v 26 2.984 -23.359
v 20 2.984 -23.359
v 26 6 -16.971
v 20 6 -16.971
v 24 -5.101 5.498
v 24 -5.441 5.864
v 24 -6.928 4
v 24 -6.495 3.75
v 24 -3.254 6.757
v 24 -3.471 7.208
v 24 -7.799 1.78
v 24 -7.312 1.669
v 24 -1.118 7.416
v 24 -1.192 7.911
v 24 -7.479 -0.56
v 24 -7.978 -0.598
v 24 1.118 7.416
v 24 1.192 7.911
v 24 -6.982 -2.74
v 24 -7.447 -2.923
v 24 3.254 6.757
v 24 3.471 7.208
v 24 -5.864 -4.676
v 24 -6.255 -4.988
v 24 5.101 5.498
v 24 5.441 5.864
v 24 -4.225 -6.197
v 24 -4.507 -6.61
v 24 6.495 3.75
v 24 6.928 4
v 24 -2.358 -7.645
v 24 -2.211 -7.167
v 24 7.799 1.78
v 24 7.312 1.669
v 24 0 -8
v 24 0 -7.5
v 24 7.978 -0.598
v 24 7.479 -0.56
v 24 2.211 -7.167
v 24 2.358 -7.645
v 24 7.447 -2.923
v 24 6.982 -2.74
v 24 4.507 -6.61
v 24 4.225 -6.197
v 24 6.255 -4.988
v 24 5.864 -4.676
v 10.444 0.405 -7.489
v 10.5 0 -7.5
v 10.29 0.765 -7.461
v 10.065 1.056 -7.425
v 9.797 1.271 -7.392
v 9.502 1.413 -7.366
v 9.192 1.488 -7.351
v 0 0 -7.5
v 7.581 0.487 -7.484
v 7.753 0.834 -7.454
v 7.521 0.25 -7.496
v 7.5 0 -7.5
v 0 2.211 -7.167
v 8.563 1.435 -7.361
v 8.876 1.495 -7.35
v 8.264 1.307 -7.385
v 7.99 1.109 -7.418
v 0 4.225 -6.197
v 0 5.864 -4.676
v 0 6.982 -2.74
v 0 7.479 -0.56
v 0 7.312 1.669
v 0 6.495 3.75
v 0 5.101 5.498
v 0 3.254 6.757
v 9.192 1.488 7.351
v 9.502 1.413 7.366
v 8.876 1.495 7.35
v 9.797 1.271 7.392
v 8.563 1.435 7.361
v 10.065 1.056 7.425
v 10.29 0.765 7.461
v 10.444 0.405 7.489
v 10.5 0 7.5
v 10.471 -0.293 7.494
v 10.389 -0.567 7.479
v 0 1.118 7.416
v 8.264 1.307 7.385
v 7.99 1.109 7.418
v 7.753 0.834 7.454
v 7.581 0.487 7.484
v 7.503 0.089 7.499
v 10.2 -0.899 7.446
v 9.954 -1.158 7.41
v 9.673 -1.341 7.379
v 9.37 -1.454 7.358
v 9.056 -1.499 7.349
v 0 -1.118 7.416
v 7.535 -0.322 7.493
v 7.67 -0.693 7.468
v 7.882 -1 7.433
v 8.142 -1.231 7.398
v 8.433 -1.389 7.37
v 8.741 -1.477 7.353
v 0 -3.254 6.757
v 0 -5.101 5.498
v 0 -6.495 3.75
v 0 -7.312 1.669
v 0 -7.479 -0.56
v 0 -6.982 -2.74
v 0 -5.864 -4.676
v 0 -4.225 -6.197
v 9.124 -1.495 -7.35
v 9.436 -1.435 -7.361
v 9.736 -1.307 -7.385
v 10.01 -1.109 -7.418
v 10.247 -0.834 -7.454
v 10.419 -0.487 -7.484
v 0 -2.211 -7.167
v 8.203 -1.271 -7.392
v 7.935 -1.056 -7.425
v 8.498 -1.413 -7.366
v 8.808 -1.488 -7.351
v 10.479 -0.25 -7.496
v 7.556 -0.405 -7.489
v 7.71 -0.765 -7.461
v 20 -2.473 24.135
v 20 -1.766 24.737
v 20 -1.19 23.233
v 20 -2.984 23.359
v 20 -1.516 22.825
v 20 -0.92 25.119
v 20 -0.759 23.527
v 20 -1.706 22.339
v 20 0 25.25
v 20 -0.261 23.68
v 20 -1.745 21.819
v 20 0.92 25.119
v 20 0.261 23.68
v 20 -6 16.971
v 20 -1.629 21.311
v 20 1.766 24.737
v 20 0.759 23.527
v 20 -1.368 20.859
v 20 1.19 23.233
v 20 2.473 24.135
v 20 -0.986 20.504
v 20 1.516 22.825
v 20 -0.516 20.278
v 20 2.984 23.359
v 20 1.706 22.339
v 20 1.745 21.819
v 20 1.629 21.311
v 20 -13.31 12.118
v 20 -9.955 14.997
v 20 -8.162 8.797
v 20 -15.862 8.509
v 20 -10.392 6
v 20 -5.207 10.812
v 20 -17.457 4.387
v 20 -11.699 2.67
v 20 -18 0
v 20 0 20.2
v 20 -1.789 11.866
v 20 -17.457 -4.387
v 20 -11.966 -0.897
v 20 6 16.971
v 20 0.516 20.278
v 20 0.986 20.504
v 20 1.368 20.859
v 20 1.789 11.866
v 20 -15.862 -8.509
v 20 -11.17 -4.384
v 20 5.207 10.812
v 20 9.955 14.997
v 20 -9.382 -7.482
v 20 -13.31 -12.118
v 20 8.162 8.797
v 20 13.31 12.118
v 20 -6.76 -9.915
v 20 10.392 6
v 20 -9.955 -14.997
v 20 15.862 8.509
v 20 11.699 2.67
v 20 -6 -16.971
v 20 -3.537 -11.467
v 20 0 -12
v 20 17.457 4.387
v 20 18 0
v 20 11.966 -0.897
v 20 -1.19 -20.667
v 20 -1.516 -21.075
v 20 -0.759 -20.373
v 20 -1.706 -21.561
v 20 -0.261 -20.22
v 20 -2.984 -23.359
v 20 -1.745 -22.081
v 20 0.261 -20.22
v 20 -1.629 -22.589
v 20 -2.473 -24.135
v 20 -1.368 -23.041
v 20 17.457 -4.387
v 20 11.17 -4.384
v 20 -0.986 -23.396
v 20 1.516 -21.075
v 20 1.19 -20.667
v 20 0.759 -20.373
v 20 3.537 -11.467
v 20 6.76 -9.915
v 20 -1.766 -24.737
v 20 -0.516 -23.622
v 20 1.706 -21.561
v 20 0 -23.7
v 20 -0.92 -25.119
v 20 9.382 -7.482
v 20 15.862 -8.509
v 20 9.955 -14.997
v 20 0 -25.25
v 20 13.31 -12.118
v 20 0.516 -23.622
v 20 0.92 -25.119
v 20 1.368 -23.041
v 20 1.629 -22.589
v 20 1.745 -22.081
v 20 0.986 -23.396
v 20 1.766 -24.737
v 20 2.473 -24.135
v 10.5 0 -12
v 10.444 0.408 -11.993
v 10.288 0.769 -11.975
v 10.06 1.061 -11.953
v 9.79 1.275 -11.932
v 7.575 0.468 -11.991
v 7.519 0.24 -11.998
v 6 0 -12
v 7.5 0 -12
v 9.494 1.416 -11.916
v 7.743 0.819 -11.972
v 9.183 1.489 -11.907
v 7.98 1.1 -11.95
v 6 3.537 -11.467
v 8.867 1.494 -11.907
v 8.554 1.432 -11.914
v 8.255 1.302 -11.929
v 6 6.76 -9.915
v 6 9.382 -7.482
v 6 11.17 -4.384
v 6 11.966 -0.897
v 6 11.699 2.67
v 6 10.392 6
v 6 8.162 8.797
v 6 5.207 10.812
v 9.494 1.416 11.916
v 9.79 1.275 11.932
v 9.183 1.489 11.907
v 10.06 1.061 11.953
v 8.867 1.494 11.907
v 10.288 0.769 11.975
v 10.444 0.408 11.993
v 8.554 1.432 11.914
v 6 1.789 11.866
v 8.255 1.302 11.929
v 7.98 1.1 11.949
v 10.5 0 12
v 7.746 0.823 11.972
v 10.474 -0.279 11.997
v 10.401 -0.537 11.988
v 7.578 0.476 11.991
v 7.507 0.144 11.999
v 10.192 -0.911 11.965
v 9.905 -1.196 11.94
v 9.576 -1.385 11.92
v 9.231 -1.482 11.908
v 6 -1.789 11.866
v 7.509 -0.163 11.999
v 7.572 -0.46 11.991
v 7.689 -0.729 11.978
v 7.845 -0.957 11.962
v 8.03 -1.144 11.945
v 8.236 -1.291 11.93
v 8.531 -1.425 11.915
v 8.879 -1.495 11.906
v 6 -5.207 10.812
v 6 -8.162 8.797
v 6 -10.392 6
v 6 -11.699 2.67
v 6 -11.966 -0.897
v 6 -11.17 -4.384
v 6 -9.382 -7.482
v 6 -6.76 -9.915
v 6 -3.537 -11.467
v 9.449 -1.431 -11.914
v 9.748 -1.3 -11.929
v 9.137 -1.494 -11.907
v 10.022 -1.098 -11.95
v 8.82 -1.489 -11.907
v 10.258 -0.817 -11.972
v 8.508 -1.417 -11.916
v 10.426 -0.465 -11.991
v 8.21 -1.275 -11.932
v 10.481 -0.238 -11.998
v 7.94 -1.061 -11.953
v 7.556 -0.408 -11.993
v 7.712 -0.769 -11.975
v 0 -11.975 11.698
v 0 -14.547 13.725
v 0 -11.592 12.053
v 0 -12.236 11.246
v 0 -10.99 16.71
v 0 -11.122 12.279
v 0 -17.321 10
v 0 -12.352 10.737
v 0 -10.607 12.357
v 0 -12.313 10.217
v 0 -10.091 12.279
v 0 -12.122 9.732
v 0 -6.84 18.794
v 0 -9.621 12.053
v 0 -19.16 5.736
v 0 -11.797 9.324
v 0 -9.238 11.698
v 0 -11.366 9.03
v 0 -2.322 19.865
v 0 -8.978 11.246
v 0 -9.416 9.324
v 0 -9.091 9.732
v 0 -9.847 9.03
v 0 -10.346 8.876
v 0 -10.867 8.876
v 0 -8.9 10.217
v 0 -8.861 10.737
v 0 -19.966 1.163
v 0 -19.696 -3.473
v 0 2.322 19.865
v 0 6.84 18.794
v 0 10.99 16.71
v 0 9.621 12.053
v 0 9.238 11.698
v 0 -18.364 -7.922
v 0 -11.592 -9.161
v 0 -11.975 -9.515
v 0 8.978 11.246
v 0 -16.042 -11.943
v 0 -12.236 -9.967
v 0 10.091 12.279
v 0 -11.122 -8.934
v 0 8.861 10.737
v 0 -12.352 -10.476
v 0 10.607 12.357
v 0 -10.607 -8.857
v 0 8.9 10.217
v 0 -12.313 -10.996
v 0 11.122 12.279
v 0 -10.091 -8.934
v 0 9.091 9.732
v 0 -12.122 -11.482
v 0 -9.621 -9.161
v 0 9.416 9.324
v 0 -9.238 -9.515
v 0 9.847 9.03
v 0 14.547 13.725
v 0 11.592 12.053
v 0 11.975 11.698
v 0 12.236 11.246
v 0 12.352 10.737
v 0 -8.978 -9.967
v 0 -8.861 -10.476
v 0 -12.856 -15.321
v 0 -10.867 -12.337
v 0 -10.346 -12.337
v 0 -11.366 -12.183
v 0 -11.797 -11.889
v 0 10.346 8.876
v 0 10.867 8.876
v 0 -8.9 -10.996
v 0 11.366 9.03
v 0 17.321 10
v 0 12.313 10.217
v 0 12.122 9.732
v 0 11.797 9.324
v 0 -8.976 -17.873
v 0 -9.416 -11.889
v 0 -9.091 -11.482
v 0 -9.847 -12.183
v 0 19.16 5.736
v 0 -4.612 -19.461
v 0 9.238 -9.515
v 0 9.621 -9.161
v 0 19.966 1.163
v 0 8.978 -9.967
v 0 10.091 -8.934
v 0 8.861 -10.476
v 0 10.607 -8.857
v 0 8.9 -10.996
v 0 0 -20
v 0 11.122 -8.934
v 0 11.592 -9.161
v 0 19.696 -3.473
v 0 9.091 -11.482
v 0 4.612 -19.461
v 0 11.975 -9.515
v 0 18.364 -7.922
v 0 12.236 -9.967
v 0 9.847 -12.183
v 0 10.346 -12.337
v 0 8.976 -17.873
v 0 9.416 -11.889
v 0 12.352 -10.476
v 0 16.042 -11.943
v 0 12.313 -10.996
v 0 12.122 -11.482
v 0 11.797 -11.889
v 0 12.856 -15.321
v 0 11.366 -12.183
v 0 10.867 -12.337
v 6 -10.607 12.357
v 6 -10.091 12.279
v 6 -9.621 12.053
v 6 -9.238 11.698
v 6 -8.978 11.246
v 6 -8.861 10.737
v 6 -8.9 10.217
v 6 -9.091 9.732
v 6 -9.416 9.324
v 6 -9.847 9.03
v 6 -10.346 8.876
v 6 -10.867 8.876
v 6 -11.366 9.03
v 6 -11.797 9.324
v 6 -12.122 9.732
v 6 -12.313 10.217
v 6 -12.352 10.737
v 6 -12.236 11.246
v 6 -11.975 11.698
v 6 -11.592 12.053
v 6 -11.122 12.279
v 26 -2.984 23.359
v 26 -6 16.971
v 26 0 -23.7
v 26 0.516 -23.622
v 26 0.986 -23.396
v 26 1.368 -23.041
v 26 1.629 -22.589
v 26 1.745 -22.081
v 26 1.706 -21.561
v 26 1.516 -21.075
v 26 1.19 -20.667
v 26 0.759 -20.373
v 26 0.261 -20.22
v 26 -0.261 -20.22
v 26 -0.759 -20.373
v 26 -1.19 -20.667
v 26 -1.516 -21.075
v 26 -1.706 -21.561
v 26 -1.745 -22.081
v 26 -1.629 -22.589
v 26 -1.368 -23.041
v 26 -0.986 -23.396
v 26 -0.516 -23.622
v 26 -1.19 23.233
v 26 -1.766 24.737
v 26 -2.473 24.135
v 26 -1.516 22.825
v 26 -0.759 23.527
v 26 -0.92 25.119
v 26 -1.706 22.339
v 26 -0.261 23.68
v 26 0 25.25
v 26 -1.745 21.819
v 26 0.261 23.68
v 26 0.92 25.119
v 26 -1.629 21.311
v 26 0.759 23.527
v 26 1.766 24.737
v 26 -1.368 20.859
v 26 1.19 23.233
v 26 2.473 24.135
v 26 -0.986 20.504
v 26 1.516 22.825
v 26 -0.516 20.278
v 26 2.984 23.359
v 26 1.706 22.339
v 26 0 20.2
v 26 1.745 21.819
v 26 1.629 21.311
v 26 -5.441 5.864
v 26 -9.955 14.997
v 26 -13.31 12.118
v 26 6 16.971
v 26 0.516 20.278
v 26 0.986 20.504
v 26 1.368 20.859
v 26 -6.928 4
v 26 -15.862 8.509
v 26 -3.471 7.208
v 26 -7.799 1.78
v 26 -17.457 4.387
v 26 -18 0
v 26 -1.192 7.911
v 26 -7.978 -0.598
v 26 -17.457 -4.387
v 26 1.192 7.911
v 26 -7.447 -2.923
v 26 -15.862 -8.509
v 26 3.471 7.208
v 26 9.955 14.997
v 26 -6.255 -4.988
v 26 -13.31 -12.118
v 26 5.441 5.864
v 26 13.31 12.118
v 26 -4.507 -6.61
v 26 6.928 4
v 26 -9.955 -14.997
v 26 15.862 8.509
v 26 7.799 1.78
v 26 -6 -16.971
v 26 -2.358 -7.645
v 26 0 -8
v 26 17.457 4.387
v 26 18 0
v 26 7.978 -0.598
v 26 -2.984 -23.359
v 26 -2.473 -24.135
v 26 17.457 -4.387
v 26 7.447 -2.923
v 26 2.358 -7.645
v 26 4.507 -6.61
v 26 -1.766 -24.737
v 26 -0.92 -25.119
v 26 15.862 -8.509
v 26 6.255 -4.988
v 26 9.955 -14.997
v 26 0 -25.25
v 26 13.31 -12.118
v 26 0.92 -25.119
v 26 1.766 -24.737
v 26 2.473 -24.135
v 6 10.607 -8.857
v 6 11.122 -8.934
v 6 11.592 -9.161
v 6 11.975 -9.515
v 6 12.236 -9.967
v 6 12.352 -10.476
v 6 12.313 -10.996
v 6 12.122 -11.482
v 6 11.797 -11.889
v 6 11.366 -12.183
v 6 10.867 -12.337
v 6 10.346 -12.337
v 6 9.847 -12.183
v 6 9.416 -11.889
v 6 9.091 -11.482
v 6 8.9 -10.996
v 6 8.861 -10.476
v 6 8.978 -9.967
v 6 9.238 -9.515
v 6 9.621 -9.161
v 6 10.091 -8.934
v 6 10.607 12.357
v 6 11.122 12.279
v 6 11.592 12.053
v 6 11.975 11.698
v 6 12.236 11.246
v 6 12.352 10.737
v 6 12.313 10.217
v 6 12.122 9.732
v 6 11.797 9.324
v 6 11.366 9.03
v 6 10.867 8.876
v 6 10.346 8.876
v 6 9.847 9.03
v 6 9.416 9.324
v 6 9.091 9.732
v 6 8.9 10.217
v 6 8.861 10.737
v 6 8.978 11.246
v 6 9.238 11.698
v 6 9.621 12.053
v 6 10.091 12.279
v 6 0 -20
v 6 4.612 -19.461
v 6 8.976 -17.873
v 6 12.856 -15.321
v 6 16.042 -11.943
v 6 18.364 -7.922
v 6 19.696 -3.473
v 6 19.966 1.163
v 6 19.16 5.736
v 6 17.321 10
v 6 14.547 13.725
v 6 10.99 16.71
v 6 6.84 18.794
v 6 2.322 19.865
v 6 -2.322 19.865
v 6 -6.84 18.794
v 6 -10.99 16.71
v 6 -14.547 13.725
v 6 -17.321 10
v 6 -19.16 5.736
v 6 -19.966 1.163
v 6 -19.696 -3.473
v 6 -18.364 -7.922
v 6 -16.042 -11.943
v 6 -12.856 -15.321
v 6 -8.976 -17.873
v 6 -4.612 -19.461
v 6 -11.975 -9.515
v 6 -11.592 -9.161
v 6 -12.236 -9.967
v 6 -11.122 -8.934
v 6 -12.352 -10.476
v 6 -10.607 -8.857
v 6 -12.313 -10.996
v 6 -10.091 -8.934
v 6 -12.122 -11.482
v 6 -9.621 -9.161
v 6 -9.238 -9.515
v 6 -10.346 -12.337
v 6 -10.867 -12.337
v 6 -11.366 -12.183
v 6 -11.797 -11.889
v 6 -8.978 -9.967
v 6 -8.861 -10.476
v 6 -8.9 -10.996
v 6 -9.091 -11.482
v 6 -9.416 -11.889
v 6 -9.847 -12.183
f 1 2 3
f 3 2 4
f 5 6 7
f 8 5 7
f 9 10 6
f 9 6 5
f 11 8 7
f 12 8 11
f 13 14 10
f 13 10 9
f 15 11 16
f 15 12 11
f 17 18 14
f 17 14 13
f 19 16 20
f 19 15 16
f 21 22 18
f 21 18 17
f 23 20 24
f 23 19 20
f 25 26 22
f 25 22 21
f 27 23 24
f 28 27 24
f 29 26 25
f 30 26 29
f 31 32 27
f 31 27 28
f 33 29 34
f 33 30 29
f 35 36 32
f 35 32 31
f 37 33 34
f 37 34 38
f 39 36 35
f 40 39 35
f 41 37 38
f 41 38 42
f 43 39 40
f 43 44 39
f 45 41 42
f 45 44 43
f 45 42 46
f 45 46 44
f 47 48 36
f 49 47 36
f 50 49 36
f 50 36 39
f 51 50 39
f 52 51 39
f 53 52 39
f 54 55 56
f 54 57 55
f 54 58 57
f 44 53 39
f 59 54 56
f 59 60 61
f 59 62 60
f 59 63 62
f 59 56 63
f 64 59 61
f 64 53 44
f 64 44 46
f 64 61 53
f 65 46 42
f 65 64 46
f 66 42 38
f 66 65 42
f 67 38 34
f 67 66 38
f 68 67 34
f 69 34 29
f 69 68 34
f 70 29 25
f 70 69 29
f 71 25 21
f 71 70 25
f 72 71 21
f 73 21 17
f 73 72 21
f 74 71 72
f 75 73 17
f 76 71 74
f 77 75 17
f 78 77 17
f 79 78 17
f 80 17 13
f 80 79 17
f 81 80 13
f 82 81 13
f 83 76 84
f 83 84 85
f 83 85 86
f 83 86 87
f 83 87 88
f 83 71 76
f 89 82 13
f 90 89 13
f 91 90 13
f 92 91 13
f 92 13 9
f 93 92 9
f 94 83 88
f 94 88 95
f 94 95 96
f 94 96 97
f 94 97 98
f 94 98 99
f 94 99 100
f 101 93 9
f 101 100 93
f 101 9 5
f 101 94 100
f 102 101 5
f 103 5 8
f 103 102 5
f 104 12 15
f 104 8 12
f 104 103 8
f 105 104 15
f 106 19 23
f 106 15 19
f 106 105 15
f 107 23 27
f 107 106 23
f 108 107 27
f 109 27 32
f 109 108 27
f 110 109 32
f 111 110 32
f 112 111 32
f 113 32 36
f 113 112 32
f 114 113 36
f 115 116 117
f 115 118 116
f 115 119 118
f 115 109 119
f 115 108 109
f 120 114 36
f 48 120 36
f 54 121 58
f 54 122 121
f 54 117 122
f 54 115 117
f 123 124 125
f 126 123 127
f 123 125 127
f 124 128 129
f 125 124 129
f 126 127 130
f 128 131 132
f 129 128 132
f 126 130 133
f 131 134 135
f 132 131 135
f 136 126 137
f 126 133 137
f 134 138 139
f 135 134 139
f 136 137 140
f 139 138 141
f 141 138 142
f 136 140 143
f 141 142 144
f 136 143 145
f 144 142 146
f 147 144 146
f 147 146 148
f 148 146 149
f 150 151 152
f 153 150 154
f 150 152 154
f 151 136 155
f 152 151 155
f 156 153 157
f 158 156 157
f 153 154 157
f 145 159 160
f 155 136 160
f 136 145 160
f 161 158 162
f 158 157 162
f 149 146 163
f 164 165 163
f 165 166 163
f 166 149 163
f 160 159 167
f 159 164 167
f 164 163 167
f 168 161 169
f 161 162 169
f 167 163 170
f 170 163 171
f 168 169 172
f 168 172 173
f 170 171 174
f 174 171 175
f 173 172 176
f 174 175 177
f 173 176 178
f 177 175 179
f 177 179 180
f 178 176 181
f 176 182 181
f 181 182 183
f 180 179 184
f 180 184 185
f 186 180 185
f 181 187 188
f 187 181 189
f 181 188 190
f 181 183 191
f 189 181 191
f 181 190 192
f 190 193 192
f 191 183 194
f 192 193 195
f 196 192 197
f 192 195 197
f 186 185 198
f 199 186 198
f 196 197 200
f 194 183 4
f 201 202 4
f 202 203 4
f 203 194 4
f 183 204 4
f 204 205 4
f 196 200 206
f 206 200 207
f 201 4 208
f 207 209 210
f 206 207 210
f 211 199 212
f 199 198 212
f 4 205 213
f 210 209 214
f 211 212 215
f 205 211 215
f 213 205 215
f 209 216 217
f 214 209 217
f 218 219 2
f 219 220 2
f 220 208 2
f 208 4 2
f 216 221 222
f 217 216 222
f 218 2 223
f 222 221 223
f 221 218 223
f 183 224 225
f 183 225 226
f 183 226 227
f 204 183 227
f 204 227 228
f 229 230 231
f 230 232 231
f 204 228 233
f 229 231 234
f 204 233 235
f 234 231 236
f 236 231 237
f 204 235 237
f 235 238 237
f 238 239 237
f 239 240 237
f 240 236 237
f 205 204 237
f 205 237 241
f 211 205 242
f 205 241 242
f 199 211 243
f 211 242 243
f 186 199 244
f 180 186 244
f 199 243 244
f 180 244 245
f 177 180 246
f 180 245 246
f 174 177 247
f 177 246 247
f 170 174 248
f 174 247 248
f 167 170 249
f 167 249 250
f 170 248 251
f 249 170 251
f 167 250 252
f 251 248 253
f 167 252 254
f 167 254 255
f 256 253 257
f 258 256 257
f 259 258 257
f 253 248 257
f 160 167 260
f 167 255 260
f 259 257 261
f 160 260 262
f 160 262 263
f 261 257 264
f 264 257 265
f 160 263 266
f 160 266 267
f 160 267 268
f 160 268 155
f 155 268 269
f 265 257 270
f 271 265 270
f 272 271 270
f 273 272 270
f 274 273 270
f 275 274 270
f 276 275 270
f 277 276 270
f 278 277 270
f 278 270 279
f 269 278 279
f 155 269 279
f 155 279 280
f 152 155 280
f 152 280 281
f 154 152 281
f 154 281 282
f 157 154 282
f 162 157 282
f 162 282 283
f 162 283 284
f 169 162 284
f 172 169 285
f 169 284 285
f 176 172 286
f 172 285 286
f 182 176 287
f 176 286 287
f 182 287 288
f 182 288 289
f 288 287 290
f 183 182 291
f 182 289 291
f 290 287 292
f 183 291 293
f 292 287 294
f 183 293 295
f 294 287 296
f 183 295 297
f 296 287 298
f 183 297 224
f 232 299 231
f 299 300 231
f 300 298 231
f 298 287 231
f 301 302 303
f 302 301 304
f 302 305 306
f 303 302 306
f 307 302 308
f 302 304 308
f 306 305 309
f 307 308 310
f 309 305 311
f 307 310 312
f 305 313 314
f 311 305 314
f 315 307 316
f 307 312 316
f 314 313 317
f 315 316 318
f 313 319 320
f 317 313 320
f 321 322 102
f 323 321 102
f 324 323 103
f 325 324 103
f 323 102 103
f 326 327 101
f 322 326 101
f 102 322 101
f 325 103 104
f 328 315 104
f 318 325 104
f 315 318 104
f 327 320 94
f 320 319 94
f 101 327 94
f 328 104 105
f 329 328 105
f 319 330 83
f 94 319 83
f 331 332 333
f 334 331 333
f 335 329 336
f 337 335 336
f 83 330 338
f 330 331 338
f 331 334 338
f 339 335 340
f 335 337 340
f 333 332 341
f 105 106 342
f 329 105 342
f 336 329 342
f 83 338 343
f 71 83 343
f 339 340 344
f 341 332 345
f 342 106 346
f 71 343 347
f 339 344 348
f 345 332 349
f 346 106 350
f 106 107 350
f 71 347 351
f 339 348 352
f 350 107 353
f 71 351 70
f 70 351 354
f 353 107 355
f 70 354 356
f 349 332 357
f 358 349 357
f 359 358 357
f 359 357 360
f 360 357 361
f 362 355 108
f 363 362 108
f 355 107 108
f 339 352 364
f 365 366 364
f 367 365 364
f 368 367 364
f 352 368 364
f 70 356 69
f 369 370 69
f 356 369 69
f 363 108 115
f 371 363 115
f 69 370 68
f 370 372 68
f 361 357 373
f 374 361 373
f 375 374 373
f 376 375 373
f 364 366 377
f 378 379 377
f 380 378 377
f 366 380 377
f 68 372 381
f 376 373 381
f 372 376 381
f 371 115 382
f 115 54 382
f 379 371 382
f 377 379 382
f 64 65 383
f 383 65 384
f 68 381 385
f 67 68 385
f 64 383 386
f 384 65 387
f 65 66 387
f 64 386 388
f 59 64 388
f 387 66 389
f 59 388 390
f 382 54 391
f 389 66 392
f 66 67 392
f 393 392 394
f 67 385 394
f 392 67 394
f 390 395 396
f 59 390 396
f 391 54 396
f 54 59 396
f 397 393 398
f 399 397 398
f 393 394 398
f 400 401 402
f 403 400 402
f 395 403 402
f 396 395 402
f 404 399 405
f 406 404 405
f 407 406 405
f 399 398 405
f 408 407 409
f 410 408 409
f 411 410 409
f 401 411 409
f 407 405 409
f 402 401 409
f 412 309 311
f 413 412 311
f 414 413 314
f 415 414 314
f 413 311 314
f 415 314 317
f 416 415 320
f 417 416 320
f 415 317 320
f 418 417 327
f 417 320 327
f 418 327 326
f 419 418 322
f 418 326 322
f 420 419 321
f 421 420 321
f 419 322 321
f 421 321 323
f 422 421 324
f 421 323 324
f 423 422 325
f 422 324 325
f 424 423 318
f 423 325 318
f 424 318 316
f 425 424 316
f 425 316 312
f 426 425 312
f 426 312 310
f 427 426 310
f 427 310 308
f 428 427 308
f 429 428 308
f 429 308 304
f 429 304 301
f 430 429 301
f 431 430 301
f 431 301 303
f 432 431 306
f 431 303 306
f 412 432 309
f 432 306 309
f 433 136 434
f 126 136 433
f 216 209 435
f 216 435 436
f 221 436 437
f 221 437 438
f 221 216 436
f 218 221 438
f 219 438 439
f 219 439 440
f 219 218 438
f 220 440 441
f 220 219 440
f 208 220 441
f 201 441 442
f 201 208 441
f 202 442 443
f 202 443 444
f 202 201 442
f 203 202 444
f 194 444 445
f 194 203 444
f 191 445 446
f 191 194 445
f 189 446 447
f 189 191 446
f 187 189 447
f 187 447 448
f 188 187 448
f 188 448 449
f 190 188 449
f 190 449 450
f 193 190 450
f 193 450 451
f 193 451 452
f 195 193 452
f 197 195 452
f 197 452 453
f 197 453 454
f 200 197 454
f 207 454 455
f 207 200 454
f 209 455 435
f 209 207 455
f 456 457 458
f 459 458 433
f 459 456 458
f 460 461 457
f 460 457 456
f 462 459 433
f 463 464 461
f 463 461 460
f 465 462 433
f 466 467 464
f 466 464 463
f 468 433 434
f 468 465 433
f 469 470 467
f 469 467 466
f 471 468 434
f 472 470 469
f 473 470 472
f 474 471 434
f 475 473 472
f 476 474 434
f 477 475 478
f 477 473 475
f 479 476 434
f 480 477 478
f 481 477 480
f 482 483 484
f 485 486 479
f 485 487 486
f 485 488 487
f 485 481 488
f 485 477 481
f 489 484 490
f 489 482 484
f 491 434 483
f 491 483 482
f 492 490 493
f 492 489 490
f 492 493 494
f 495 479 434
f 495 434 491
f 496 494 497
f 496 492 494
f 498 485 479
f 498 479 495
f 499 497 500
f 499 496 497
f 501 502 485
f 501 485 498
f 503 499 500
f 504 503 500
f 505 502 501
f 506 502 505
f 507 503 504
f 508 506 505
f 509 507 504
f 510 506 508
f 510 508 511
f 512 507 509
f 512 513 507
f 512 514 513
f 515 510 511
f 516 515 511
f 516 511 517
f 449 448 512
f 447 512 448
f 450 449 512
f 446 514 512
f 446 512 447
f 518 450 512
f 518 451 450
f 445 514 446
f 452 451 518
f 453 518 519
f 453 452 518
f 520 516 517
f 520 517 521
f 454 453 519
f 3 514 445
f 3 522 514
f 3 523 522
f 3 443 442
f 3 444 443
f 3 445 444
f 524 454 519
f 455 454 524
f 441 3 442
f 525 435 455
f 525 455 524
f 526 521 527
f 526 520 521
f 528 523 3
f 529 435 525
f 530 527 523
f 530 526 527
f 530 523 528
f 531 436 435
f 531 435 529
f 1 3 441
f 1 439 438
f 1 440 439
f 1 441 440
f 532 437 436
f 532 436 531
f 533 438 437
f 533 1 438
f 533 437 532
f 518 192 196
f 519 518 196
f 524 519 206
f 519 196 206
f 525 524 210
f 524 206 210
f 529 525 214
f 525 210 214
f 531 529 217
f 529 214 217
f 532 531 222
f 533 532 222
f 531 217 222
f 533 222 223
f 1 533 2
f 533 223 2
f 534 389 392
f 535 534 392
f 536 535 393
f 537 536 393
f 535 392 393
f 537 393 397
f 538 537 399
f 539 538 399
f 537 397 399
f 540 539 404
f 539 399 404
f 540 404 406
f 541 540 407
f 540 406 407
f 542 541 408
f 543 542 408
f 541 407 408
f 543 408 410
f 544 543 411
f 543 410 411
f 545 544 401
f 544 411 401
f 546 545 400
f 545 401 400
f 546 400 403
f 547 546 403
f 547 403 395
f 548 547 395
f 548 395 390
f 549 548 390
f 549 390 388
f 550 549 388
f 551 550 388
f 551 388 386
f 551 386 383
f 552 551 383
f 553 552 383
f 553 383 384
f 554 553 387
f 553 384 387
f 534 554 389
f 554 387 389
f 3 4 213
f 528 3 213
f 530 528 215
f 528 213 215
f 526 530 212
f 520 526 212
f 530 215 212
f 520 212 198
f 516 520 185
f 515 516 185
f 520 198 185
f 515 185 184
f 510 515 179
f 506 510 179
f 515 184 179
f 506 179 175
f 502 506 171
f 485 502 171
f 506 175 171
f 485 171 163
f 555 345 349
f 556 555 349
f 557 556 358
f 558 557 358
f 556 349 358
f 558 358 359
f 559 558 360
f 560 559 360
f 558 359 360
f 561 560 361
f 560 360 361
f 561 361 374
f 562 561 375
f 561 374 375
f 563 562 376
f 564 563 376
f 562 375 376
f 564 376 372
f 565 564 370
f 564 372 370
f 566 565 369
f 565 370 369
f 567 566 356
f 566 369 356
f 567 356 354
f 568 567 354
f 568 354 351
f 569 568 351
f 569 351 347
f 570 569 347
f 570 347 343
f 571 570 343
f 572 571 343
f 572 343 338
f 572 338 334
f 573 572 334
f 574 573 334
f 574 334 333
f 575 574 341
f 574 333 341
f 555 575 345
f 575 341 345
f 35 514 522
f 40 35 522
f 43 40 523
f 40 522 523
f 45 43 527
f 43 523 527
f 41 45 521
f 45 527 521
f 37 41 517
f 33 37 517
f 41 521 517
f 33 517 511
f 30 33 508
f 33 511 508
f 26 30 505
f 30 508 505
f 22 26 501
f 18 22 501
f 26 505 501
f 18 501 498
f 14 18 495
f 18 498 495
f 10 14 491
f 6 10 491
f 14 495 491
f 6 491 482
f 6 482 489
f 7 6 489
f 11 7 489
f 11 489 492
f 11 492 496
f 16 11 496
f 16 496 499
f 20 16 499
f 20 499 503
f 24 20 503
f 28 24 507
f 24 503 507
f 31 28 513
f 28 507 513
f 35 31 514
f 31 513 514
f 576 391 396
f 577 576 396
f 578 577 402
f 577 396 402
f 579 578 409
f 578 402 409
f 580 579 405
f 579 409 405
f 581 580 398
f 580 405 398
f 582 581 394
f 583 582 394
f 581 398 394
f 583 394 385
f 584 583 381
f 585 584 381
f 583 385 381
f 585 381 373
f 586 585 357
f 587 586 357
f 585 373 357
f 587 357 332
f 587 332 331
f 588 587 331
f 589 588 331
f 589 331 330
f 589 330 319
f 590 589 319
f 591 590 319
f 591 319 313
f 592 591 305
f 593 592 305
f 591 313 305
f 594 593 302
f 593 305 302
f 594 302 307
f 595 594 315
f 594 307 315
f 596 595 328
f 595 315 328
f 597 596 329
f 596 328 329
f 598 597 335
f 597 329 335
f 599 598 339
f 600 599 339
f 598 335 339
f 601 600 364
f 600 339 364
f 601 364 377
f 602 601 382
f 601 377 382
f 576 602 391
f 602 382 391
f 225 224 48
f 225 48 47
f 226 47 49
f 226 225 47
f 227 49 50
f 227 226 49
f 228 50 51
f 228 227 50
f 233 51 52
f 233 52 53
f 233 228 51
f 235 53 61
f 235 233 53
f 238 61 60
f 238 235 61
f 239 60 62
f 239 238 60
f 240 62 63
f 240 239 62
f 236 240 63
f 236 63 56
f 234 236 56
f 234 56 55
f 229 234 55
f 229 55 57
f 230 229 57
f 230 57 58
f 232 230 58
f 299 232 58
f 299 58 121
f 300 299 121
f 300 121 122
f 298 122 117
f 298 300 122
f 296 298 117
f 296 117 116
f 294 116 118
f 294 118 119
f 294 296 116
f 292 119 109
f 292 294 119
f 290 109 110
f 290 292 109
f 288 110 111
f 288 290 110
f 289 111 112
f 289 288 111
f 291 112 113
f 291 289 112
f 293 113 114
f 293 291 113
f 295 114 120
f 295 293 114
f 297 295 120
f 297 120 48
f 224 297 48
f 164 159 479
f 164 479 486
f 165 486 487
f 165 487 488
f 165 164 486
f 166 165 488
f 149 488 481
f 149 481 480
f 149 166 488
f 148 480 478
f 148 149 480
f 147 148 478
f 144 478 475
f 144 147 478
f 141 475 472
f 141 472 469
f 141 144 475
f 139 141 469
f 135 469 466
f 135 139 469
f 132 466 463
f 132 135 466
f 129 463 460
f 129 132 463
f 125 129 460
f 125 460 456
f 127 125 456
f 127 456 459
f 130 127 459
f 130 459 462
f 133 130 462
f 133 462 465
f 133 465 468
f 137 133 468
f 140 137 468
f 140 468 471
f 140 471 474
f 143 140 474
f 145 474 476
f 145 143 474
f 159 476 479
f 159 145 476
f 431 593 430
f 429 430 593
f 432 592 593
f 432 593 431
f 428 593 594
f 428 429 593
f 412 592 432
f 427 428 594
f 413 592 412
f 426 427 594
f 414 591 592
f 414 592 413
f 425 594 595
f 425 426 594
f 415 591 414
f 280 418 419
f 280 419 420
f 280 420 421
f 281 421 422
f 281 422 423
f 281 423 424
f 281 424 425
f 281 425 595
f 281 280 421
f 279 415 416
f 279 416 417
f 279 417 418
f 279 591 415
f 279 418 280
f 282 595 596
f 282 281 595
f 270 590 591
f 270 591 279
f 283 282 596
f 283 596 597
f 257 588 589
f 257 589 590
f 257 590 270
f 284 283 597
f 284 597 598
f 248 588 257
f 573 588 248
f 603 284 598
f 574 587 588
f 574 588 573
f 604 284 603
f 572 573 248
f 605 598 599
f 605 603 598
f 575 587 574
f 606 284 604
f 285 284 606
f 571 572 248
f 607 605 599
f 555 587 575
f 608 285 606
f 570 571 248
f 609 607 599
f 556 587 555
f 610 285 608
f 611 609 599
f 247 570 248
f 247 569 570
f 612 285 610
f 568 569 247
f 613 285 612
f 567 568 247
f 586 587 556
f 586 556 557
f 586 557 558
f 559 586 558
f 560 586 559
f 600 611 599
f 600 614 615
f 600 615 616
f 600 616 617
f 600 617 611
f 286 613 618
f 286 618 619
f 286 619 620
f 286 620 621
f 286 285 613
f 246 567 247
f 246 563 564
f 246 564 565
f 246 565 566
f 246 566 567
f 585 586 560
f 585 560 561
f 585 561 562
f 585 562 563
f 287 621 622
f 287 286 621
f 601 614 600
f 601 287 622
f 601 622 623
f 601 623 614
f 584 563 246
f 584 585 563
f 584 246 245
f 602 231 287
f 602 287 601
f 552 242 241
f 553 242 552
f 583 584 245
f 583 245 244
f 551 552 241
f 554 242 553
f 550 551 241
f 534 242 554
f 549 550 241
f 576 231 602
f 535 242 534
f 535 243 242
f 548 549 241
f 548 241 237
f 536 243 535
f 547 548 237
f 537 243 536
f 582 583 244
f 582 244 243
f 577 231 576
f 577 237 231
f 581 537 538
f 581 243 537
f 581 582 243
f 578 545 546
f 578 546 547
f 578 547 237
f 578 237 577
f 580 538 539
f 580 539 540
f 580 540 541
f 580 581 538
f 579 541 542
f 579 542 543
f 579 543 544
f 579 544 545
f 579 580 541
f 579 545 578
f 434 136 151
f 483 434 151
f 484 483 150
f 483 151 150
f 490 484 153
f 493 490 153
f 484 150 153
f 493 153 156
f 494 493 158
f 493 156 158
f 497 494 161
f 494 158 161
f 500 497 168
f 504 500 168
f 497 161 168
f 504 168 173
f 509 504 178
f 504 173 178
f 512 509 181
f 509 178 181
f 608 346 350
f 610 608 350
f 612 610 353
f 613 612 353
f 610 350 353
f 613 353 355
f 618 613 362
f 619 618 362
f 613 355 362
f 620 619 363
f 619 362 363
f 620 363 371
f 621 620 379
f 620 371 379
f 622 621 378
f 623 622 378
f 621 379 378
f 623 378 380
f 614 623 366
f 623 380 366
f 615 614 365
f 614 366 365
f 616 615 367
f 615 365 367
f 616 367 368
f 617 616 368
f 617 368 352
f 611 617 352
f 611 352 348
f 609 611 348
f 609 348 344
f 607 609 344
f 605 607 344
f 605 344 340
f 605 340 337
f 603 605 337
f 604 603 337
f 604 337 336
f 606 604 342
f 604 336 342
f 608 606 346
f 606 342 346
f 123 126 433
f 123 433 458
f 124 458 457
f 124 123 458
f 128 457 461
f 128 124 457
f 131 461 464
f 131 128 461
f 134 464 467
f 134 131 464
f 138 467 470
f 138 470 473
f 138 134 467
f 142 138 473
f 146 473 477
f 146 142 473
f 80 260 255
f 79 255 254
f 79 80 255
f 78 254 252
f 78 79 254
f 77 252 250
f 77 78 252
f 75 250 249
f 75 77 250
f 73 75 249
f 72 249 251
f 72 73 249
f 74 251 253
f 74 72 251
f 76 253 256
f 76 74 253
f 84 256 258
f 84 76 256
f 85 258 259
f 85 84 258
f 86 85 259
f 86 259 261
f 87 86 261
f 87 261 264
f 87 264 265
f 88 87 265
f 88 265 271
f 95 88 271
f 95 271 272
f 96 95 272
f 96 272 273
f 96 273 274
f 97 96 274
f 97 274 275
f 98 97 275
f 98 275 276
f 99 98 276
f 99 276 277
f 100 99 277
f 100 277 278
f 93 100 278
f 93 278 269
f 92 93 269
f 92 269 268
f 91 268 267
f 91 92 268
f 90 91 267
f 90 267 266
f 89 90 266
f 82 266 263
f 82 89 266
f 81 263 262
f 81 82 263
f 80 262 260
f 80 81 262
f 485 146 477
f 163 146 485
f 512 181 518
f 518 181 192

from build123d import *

# Parameters (mm, degrees)
SKETCH1_R               = 20
SKETCH1_R_2             = 7.5
BOSS_EXTRUDE1_DEPTH     = 6
SKETCH3_R               = 12
SKETCH3_R_2             = 7.5
BOSS_EXTRUDE2_DEPTH     = 14
CUT_EXTRUDE2_DEPTH      = 35.641016151
CUT_EXTRUDE2_DEPTH_BACK = 35.641016151
SKETCH4_R               = 1.5
SKETCH5_R               = 18
SKETCH5_R_2             = 7.5
BOSS_EXTRUDE3_DEPTH     = 6
BOSS_EXTRUDE4_START     = -6
SKETCH6_R               = 1.75
BOSS_EXTRUDE4_DEPTH     = 6
SKETCH2_R               = 1.75
CUT_EXTRUDE1_DEPTH      = 6
SKETCH7_R               = 8
CUT_EXTRUDE3_DEPTH      = 2


with BuildPart() as part:
    # Sketch1 → Boss-Extrude1 (new body)
    with BuildSketch(Plane(origin=(0, 0, 0), x_dir=(0, 0, -1), z_dir=(1, 0, 0))):
        Circle(SKETCH1_R)
        Circle(SKETCH1_R_2, mode=Mode.SUBTRACT)
    extrude(amount=BOSS_EXTRUDE1_DEPTH)

    # Sketch3 → Boss-Extrude2 (add)
    with BuildSketch(Plane(origin=(6, 0, 0), x_dir=(0, 0, -1), z_dir=(1, 0, 0))):
        Circle(SKETCH3_R)
        Circle(SKETCH3_R_2, mode=Mode.SUBTRACT)
    extrude(amount=BOSS_EXTRUDE2_DEPTH)

    # Sketch4 → Cut-Extrude2 (cut, two sides: drawn at the far end of the back side and taken through both)
    with BuildSketch(Plane.XY.offset(-CUT_EXTRUDE2_DEPTH_BACK)):
        with Locations((9, 0)):
            Circle(SKETCH4_R)
    extrude(amount=CUT_EXTRUDE2_DEPTH + CUT_EXTRUDE2_DEPTH_BACK, mode=Mode.SUBTRACT)

    # Sketch5 → Boss-Extrude3 (add)
    with BuildSketch(Plane(origin=(20, 0, 0), x_dir=(0, 0, -1), z_dir=(1, 0, 0))):
        Circle(SKETCH5_R)
        Circle(SKETCH5_R_2, mode=Mode.SUBTRACT)
    extrude(amount=BOSS_EXTRUDE3_DEPTH)

    # Sketch6 → Boss-Extrude4 (add)
    # profile 1 of 2: a face of its own
    with BuildSketch(Plane(origin=(26, 0, 0), x_dir=(0, 0, -1), z_dir=(1, 0, 0)).offset(BOSS_EXTRUDE4_START)):
        with BuildLine():
            Line((-23.358800107, 2.984171955), (-16.970562748, 6))
            ThreePointArc((-16.970562748, 6), (-18, 0), (-16.970562748, -6))
            Line((-16.970562748, -6), (-23.358800107, -2.984171955))
            ThreePointArc((-23.358800107, -2.984171955), (-25.25, 0), (-23.358800107, 2.984171955))
        make_face()
        with Locations((-21.95, 0)):
            Circle(SKETCH6_R, mode=Mode.SUBTRACT)
    # profile 2 of 2: a face of its own
    with BuildSketch(Plane(origin=(26, 0, 0), x_dir=(0, 0, -1), z_dir=(1, 0, 0)).offset(BOSS_EXTRUDE4_START)):
        with BuildLine():
            Line((23.358800107, 2.984171955), (16.970562748, 6))
            ThreePointArc((16.970562748, 6), (18, 0), (16.970562748, -6))
            Line((16.970562748, -6), (23.358800107, -2.984171955))
            ThreePointArc((23.358800107, -2.984171955), (25.25, 0), (23.358800107, 2.984171955))
        make_face()
        with Locations((21.95, 0)):
            Circle(SKETCH6_R, mode=Mode.SUBTRACT)
    extrude(amount=BOSS_EXTRUDE4_DEPTH)

    # Sketch2 → Cut-Extrude1 (cut)
    with BuildSketch(Plane.ZY):
        with Locations((-10.606601718, 10.606601718)):
            Circle(SKETCH2_R)
        with Locations((10.606601718, 10.606601718)):
            Circle(SKETCH2_R)
        with Locations((10.606601718, -10.606601718)):
            Circle(SKETCH2_R)
        with Locations((-10.606601718, -10.606601718)):
            Circle(SKETCH2_R)
    extrude(amount=-CUT_EXTRUDE1_DEPTH, mode=Mode.SUBTRACT)

    # Sketch7 → Cut-Extrude3 (cut)
    with BuildSketch(Plane(origin=(26, 0, 0), x_dir=(0, 0, -1), z_dir=(1, 0, 0))):
        Circle(SKETCH7_R)
    extrude(amount=-CUT_EXTRUDE3_DEPTH, mode=Mode.SUBTRACT)


solid = part.part
